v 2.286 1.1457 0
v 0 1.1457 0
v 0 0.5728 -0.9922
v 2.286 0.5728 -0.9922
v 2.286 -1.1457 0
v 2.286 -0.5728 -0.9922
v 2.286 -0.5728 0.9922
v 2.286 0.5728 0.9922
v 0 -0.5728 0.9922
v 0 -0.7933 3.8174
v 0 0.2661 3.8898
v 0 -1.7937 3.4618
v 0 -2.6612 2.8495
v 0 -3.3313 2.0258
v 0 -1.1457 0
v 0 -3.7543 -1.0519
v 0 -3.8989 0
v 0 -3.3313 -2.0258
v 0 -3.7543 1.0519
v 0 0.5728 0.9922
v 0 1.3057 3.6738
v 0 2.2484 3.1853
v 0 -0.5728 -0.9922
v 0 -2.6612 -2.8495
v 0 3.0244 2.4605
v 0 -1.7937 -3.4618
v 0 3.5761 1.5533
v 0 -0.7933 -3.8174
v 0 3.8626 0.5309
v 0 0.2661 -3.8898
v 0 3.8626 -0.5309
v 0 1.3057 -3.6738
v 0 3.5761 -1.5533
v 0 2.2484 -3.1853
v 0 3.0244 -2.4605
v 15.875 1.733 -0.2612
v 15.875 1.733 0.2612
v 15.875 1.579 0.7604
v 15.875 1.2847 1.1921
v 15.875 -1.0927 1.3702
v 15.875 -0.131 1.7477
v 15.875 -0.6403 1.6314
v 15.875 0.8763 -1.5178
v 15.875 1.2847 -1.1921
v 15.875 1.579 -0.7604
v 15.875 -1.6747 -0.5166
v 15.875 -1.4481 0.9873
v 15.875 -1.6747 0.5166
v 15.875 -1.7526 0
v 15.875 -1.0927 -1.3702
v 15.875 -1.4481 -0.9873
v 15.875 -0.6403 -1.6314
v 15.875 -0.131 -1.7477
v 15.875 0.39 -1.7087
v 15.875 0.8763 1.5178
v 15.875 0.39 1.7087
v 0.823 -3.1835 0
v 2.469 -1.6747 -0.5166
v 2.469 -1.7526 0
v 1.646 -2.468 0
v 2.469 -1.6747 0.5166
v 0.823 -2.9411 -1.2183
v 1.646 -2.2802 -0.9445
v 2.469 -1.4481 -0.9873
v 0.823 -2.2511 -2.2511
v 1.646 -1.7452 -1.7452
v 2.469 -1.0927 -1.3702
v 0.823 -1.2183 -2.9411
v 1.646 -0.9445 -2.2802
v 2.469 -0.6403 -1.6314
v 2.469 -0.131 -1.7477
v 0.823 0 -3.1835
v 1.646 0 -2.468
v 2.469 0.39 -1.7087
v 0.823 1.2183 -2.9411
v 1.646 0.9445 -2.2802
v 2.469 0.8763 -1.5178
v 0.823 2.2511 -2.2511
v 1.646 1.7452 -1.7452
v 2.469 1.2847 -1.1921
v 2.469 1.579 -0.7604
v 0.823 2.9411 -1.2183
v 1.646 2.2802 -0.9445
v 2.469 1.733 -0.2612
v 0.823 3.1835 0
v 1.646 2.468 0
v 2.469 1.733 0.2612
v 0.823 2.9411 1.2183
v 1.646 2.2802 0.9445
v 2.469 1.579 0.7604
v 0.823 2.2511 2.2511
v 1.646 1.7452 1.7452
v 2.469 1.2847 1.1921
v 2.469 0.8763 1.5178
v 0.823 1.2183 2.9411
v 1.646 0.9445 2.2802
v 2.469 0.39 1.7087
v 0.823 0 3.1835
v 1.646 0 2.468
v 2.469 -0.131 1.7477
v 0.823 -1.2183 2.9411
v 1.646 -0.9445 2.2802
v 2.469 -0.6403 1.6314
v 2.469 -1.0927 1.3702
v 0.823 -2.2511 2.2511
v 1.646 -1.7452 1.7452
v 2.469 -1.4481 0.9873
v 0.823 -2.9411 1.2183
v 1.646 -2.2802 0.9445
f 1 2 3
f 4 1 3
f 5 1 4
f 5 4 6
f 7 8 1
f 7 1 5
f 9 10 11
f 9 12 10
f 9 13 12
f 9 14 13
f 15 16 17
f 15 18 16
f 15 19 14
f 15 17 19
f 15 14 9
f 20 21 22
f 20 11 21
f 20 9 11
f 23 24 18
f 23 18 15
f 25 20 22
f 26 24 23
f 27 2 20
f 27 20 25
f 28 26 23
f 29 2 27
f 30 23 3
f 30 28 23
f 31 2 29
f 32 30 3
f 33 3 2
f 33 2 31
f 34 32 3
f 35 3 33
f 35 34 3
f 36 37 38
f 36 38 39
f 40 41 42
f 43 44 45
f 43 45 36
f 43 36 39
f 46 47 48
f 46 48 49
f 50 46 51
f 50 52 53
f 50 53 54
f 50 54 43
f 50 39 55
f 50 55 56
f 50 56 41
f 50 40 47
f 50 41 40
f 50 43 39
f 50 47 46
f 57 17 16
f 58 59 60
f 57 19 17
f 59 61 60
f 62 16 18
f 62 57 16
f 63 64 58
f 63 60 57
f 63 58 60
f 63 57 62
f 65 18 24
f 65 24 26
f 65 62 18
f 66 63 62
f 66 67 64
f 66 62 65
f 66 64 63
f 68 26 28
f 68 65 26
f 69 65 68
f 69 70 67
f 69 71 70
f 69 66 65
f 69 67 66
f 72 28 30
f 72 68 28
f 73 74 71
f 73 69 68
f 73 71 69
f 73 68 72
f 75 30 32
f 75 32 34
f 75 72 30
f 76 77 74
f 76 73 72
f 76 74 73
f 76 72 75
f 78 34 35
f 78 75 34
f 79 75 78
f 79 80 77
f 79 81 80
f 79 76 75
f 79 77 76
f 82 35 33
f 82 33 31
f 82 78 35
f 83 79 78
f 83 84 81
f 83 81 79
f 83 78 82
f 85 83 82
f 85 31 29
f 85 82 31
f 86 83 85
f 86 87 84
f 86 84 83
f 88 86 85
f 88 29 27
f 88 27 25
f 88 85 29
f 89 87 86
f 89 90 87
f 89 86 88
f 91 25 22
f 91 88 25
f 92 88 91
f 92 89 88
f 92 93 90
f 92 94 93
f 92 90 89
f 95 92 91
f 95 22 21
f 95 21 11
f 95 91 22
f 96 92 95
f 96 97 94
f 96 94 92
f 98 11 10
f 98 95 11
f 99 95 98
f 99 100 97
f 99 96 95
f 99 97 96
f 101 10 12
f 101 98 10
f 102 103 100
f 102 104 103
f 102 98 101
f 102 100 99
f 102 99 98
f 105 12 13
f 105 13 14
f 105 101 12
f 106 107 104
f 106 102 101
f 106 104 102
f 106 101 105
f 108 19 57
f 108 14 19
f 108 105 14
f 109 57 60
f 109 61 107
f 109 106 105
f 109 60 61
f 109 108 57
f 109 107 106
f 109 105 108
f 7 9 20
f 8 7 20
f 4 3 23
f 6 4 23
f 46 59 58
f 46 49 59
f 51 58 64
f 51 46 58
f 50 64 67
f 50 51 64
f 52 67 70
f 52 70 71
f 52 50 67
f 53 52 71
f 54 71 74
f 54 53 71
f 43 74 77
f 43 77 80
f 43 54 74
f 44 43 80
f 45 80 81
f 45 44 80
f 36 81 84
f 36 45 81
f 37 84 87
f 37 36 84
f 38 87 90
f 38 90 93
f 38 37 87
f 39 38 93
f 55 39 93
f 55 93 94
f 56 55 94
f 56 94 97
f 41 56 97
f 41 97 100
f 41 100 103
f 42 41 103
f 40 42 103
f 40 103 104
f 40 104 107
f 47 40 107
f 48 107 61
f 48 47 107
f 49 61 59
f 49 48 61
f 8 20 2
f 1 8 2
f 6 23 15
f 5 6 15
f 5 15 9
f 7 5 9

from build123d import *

# Parameters (mm, degrees)
F4_DEPTH = 2.286


# Not quite as in the source:
# - a feature names something its author has since deleted; it is built from what else it names


with BuildPart() as f2:
    # F0 (on Top) → F2 (revolve)
    with BuildSketch(Plane.XY):
        Polygon((2.4690357124, -1.7526), (15.875, -1.7526), (15.875, 0), (0, 0), (0, -3.8989), align=None)
    revolve(axis=Axis((4.9627271947, 0, 0), (1, 0, 0)))

    # F3 (on face) → F4 (cut)
    with BuildSketch(Plane(origin=(0, 0, 0), x_dir=(0, -1, 0), z_dir=(-1, 0, 0))):
        Polygon((0.5728397202, 0.9921875), (-0.5728397202, 0.9921875), (-1.1456794404, 0), (-0.5728397202, -0.9921875), (0.5728397202, -0.9921875), (1.1456794404, 0), align=None)
    extrude(amount=-F4_DEPTH, mode=Mode.SUBTRACT)


solid = f2.part
